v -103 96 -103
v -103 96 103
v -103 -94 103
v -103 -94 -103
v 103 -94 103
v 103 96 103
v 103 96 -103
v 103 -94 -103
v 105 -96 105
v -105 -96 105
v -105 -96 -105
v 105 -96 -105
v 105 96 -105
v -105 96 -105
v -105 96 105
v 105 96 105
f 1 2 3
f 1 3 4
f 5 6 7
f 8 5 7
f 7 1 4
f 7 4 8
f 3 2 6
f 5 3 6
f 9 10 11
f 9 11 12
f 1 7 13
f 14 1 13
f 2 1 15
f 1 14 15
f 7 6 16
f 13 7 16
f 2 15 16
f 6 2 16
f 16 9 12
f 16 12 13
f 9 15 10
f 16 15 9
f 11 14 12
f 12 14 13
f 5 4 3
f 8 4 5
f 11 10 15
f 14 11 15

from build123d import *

# Parameters (mm, degrees)
SKETCH1_W           = 210
SKETCH1_H           = 192
BOSS_EXTRUDE1_DEPTH = 105
SKETCH2_W           = 206
SKETCH2_H           = 206
CUT_EXTRUDE1_DEPTH  = 190


with BuildPart() as part:
    # Sketch1 → Boss-Extrude1 (new body, symmetric)
    with BuildSketch(Plane.XY):
        Rectangle(SKETCH1_W, SKETCH1_H)
    extrude(amount=BOSS_EXTRUDE1_DEPTH, both=True)

    # Sketch2 → Cut-Extrude1 (cut)
    with BuildSketch(Plane(origin=(0, 96, 0), x_dir=(1, 0, 0), z_dir=(0, 1, 0))):
        Rectangle(SKETCH2_W, SKETCH2_H)
    extrude(amount=-CUT_EXTRUDE1_DEPTH, mode=Mode.SUBTRACT)


solid = part.part
